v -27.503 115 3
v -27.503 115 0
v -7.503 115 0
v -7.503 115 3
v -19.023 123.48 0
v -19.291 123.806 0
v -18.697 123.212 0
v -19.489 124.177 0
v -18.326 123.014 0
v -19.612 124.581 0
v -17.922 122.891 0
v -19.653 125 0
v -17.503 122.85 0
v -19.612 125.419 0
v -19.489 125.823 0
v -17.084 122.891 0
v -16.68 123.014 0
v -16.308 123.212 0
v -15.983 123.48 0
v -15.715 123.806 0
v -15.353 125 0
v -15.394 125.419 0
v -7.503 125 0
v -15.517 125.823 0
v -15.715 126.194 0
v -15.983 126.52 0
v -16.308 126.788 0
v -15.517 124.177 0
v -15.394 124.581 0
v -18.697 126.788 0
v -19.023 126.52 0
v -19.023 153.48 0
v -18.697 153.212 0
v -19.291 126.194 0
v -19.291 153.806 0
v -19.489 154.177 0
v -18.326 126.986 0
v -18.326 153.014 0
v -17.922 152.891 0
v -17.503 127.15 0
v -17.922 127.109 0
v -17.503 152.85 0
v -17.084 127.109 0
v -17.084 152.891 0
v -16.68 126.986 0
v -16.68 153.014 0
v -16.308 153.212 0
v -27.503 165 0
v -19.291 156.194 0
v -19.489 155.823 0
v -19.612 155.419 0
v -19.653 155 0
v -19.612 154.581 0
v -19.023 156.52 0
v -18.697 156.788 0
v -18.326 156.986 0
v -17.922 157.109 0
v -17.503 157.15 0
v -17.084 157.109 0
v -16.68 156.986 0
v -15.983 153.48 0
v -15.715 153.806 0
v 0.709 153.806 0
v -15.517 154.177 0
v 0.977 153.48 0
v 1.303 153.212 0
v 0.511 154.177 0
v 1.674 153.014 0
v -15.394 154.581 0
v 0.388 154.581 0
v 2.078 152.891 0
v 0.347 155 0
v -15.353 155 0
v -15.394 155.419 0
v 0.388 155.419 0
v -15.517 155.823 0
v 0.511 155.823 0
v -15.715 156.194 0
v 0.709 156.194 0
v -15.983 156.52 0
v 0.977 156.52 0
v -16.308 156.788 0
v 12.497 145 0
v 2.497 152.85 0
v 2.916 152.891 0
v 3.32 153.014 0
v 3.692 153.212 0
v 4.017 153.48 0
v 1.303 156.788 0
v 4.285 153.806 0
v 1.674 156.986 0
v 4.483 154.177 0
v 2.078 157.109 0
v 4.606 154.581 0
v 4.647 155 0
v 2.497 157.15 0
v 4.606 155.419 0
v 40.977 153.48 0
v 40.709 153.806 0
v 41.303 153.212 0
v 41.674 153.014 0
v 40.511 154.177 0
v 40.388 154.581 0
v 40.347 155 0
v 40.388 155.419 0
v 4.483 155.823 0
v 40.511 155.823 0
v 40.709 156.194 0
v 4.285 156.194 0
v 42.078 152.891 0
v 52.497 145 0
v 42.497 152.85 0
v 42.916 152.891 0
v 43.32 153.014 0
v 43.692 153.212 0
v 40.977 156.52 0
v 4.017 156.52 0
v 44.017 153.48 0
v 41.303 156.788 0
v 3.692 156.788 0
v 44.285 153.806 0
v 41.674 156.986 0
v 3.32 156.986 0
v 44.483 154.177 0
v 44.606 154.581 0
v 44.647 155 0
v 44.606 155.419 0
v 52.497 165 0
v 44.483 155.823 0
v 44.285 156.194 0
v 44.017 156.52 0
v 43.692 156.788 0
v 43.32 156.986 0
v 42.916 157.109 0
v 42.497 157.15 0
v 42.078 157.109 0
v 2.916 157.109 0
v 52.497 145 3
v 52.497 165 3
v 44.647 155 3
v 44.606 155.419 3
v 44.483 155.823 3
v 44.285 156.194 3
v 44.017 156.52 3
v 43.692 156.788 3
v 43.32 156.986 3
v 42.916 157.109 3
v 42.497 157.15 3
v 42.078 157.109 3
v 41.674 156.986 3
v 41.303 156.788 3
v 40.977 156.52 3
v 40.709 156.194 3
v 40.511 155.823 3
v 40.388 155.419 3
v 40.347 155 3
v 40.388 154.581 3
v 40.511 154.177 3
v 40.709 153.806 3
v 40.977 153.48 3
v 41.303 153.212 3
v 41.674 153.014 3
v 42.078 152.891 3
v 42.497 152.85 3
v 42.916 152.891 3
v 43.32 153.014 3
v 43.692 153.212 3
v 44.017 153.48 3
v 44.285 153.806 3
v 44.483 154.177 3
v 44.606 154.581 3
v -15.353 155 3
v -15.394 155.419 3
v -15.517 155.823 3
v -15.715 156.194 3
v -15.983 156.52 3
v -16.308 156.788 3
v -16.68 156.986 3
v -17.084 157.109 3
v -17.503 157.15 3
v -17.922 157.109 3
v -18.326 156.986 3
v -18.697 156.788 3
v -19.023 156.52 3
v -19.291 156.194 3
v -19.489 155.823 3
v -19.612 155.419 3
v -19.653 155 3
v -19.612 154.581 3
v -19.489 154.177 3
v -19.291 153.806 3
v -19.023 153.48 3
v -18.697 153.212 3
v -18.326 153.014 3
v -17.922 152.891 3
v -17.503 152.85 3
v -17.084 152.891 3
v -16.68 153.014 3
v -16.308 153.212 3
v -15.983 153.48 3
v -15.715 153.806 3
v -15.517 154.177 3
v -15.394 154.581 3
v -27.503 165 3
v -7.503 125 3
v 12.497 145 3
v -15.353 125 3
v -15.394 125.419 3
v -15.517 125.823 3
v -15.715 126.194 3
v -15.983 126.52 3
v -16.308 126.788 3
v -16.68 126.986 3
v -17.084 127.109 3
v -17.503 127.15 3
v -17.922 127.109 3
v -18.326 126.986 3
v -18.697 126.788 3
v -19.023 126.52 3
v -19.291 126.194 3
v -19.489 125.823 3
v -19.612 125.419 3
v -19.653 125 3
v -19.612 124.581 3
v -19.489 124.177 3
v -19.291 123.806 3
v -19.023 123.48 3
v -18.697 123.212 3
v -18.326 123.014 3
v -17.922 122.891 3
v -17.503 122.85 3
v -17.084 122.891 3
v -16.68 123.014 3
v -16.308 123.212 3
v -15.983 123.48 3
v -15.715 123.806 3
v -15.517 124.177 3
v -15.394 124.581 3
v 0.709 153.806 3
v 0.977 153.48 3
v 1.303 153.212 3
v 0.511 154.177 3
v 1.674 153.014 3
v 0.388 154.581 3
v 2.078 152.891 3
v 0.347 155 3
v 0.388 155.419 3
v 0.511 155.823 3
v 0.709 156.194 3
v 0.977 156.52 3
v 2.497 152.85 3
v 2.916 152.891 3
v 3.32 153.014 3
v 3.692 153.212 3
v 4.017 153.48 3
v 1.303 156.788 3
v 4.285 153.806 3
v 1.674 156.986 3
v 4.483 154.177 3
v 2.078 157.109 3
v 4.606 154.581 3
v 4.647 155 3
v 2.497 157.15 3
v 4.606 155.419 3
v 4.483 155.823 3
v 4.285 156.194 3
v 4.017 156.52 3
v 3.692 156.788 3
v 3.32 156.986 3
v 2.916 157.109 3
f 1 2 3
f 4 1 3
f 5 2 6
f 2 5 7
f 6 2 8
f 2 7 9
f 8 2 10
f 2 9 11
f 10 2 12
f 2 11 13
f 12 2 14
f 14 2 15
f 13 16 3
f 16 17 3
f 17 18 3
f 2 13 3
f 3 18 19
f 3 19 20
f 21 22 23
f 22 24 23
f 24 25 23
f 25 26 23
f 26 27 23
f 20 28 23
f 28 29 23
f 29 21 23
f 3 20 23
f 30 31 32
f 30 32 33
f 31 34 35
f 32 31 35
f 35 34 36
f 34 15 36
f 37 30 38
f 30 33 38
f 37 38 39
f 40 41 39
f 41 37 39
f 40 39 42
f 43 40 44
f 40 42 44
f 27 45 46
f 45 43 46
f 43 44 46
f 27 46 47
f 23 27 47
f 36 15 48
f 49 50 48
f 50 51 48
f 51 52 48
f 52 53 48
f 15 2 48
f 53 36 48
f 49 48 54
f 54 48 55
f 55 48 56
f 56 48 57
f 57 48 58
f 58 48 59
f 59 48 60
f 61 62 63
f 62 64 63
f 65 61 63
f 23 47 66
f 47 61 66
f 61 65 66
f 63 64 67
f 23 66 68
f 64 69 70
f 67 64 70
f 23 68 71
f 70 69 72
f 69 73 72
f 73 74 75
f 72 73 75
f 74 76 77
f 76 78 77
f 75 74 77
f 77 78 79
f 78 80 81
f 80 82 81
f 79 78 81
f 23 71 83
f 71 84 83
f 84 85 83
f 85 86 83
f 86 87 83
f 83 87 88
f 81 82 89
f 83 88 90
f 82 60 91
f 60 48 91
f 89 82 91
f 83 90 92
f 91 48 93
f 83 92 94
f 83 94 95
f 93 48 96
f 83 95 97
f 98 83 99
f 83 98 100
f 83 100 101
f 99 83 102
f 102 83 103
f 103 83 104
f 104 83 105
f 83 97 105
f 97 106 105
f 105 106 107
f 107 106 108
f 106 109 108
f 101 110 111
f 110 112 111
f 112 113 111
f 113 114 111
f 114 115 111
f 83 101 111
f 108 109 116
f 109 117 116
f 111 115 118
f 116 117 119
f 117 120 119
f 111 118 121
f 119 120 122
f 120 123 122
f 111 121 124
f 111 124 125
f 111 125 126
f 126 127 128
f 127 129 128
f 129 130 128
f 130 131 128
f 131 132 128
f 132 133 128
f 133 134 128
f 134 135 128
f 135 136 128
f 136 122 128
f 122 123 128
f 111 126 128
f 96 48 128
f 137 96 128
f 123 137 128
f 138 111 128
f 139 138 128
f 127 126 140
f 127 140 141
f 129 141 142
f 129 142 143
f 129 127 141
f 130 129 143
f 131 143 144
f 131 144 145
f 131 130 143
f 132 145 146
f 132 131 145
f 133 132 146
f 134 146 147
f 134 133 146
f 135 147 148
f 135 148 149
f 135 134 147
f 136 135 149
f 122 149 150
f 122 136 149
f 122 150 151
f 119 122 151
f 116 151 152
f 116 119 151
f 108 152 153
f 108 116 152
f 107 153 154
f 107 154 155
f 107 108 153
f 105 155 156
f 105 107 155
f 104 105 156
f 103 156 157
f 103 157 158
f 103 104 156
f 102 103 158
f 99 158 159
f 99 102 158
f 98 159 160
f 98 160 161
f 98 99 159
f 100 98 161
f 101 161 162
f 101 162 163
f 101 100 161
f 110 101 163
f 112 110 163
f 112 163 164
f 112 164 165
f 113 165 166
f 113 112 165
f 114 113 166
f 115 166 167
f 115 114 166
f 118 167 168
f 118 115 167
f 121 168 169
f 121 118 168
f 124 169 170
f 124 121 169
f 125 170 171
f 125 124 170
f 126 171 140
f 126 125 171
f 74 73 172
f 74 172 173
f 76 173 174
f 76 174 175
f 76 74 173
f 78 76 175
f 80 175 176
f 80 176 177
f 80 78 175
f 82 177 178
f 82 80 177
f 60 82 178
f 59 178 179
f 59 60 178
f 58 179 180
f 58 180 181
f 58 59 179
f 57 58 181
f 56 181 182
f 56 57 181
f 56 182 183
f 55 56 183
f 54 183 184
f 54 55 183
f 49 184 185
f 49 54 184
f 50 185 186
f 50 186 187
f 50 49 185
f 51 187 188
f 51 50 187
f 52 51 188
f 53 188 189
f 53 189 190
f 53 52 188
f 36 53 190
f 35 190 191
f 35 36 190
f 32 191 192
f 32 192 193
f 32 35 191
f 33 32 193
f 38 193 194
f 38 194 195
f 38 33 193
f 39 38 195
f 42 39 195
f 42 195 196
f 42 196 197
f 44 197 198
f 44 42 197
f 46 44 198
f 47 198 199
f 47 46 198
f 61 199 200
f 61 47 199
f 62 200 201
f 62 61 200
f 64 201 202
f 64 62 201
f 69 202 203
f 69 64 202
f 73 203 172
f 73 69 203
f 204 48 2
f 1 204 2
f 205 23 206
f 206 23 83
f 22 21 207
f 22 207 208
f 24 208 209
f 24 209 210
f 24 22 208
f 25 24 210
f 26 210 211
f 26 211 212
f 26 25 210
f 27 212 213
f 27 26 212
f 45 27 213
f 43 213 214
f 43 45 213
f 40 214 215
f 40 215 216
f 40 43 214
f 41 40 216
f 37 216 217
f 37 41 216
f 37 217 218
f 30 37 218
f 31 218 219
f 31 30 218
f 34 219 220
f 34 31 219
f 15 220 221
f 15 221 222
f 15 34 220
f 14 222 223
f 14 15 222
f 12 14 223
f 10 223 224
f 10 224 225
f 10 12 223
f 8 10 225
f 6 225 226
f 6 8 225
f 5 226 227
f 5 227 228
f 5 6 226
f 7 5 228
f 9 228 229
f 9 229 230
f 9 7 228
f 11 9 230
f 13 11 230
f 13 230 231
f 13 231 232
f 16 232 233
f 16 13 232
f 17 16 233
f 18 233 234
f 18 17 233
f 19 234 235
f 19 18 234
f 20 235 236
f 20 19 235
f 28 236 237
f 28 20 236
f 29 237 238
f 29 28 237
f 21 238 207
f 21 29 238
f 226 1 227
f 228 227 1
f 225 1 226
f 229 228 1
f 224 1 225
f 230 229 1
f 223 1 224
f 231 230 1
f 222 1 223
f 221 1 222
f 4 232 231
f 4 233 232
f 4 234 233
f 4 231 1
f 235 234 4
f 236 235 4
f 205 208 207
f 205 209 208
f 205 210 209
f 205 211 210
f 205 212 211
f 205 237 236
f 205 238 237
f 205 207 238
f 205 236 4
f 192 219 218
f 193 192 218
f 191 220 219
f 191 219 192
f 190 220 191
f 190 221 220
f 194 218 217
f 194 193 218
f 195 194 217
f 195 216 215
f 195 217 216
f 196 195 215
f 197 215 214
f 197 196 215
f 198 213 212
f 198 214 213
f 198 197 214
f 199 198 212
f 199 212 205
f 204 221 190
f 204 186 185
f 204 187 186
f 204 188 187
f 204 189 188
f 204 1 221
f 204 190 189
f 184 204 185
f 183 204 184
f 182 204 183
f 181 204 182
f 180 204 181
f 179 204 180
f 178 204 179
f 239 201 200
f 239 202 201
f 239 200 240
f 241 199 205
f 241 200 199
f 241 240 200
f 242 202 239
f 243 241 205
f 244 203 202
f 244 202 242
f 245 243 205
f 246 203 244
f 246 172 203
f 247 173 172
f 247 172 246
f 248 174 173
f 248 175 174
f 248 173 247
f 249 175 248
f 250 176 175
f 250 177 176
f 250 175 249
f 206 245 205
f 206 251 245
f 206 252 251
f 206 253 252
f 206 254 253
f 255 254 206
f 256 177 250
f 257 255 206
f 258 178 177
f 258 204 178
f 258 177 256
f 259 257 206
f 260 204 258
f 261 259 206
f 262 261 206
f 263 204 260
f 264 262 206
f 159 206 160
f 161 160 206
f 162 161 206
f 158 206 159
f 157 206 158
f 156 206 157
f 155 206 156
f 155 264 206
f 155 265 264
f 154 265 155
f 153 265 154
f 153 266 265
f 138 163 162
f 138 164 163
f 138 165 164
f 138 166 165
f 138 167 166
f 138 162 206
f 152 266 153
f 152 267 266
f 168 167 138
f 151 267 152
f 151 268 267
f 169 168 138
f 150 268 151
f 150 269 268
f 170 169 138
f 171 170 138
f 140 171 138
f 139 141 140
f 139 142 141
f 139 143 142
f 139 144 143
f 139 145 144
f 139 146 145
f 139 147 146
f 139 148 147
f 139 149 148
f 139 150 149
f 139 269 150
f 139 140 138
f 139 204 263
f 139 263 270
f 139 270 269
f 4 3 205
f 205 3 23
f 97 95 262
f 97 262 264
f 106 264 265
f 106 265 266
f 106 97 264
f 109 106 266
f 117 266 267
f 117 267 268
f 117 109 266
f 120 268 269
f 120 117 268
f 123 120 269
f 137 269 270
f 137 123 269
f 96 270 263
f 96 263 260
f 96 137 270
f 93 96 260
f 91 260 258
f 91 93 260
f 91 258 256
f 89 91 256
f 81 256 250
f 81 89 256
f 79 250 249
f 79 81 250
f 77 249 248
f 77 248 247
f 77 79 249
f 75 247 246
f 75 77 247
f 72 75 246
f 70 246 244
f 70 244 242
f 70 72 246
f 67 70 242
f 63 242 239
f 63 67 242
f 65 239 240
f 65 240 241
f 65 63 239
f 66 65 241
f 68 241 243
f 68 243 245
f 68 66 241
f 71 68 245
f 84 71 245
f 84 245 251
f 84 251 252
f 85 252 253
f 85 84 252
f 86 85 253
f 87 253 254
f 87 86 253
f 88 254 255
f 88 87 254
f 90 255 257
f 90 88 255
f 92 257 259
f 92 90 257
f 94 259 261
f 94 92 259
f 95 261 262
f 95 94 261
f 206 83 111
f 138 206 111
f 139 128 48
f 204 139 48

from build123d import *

# Parameters (mm, degrees)
SKETCH1_R      = 2.15
EXTRUDE1_DEPTH = 3


with BuildPart() as part:
    # Sketch1 → Extrude1 (new body)
    with BuildSketch(Plane.XY):
        Polygon((52.497048214, 165), (-27.502951786, 165), (-27.502951786, 115), (-7.502951786, 115), (-7.502951786, 125), (12.497048214, 145), (52.497048214, 145), align=None)
        with Locations((2.497048214, 155)):
            Circle(SKETCH1_R, mode=Mode.SUBTRACT)
        with Locations((42.497048214, 155)):
            Circle(SKETCH1_R, mode=Mode.SUBTRACT)
        with Locations((-17.502951786, 125)):
            Circle(SKETCH1_R, mode=Mode.SUBTRACT)
        with Locations((-17.502951786, 155)):
            Circle(SKETCH1_R, mode=Mode.SUBTRACT)
    extrude(amount=EXTRUDE1_DEPTH)


solid = part.part
